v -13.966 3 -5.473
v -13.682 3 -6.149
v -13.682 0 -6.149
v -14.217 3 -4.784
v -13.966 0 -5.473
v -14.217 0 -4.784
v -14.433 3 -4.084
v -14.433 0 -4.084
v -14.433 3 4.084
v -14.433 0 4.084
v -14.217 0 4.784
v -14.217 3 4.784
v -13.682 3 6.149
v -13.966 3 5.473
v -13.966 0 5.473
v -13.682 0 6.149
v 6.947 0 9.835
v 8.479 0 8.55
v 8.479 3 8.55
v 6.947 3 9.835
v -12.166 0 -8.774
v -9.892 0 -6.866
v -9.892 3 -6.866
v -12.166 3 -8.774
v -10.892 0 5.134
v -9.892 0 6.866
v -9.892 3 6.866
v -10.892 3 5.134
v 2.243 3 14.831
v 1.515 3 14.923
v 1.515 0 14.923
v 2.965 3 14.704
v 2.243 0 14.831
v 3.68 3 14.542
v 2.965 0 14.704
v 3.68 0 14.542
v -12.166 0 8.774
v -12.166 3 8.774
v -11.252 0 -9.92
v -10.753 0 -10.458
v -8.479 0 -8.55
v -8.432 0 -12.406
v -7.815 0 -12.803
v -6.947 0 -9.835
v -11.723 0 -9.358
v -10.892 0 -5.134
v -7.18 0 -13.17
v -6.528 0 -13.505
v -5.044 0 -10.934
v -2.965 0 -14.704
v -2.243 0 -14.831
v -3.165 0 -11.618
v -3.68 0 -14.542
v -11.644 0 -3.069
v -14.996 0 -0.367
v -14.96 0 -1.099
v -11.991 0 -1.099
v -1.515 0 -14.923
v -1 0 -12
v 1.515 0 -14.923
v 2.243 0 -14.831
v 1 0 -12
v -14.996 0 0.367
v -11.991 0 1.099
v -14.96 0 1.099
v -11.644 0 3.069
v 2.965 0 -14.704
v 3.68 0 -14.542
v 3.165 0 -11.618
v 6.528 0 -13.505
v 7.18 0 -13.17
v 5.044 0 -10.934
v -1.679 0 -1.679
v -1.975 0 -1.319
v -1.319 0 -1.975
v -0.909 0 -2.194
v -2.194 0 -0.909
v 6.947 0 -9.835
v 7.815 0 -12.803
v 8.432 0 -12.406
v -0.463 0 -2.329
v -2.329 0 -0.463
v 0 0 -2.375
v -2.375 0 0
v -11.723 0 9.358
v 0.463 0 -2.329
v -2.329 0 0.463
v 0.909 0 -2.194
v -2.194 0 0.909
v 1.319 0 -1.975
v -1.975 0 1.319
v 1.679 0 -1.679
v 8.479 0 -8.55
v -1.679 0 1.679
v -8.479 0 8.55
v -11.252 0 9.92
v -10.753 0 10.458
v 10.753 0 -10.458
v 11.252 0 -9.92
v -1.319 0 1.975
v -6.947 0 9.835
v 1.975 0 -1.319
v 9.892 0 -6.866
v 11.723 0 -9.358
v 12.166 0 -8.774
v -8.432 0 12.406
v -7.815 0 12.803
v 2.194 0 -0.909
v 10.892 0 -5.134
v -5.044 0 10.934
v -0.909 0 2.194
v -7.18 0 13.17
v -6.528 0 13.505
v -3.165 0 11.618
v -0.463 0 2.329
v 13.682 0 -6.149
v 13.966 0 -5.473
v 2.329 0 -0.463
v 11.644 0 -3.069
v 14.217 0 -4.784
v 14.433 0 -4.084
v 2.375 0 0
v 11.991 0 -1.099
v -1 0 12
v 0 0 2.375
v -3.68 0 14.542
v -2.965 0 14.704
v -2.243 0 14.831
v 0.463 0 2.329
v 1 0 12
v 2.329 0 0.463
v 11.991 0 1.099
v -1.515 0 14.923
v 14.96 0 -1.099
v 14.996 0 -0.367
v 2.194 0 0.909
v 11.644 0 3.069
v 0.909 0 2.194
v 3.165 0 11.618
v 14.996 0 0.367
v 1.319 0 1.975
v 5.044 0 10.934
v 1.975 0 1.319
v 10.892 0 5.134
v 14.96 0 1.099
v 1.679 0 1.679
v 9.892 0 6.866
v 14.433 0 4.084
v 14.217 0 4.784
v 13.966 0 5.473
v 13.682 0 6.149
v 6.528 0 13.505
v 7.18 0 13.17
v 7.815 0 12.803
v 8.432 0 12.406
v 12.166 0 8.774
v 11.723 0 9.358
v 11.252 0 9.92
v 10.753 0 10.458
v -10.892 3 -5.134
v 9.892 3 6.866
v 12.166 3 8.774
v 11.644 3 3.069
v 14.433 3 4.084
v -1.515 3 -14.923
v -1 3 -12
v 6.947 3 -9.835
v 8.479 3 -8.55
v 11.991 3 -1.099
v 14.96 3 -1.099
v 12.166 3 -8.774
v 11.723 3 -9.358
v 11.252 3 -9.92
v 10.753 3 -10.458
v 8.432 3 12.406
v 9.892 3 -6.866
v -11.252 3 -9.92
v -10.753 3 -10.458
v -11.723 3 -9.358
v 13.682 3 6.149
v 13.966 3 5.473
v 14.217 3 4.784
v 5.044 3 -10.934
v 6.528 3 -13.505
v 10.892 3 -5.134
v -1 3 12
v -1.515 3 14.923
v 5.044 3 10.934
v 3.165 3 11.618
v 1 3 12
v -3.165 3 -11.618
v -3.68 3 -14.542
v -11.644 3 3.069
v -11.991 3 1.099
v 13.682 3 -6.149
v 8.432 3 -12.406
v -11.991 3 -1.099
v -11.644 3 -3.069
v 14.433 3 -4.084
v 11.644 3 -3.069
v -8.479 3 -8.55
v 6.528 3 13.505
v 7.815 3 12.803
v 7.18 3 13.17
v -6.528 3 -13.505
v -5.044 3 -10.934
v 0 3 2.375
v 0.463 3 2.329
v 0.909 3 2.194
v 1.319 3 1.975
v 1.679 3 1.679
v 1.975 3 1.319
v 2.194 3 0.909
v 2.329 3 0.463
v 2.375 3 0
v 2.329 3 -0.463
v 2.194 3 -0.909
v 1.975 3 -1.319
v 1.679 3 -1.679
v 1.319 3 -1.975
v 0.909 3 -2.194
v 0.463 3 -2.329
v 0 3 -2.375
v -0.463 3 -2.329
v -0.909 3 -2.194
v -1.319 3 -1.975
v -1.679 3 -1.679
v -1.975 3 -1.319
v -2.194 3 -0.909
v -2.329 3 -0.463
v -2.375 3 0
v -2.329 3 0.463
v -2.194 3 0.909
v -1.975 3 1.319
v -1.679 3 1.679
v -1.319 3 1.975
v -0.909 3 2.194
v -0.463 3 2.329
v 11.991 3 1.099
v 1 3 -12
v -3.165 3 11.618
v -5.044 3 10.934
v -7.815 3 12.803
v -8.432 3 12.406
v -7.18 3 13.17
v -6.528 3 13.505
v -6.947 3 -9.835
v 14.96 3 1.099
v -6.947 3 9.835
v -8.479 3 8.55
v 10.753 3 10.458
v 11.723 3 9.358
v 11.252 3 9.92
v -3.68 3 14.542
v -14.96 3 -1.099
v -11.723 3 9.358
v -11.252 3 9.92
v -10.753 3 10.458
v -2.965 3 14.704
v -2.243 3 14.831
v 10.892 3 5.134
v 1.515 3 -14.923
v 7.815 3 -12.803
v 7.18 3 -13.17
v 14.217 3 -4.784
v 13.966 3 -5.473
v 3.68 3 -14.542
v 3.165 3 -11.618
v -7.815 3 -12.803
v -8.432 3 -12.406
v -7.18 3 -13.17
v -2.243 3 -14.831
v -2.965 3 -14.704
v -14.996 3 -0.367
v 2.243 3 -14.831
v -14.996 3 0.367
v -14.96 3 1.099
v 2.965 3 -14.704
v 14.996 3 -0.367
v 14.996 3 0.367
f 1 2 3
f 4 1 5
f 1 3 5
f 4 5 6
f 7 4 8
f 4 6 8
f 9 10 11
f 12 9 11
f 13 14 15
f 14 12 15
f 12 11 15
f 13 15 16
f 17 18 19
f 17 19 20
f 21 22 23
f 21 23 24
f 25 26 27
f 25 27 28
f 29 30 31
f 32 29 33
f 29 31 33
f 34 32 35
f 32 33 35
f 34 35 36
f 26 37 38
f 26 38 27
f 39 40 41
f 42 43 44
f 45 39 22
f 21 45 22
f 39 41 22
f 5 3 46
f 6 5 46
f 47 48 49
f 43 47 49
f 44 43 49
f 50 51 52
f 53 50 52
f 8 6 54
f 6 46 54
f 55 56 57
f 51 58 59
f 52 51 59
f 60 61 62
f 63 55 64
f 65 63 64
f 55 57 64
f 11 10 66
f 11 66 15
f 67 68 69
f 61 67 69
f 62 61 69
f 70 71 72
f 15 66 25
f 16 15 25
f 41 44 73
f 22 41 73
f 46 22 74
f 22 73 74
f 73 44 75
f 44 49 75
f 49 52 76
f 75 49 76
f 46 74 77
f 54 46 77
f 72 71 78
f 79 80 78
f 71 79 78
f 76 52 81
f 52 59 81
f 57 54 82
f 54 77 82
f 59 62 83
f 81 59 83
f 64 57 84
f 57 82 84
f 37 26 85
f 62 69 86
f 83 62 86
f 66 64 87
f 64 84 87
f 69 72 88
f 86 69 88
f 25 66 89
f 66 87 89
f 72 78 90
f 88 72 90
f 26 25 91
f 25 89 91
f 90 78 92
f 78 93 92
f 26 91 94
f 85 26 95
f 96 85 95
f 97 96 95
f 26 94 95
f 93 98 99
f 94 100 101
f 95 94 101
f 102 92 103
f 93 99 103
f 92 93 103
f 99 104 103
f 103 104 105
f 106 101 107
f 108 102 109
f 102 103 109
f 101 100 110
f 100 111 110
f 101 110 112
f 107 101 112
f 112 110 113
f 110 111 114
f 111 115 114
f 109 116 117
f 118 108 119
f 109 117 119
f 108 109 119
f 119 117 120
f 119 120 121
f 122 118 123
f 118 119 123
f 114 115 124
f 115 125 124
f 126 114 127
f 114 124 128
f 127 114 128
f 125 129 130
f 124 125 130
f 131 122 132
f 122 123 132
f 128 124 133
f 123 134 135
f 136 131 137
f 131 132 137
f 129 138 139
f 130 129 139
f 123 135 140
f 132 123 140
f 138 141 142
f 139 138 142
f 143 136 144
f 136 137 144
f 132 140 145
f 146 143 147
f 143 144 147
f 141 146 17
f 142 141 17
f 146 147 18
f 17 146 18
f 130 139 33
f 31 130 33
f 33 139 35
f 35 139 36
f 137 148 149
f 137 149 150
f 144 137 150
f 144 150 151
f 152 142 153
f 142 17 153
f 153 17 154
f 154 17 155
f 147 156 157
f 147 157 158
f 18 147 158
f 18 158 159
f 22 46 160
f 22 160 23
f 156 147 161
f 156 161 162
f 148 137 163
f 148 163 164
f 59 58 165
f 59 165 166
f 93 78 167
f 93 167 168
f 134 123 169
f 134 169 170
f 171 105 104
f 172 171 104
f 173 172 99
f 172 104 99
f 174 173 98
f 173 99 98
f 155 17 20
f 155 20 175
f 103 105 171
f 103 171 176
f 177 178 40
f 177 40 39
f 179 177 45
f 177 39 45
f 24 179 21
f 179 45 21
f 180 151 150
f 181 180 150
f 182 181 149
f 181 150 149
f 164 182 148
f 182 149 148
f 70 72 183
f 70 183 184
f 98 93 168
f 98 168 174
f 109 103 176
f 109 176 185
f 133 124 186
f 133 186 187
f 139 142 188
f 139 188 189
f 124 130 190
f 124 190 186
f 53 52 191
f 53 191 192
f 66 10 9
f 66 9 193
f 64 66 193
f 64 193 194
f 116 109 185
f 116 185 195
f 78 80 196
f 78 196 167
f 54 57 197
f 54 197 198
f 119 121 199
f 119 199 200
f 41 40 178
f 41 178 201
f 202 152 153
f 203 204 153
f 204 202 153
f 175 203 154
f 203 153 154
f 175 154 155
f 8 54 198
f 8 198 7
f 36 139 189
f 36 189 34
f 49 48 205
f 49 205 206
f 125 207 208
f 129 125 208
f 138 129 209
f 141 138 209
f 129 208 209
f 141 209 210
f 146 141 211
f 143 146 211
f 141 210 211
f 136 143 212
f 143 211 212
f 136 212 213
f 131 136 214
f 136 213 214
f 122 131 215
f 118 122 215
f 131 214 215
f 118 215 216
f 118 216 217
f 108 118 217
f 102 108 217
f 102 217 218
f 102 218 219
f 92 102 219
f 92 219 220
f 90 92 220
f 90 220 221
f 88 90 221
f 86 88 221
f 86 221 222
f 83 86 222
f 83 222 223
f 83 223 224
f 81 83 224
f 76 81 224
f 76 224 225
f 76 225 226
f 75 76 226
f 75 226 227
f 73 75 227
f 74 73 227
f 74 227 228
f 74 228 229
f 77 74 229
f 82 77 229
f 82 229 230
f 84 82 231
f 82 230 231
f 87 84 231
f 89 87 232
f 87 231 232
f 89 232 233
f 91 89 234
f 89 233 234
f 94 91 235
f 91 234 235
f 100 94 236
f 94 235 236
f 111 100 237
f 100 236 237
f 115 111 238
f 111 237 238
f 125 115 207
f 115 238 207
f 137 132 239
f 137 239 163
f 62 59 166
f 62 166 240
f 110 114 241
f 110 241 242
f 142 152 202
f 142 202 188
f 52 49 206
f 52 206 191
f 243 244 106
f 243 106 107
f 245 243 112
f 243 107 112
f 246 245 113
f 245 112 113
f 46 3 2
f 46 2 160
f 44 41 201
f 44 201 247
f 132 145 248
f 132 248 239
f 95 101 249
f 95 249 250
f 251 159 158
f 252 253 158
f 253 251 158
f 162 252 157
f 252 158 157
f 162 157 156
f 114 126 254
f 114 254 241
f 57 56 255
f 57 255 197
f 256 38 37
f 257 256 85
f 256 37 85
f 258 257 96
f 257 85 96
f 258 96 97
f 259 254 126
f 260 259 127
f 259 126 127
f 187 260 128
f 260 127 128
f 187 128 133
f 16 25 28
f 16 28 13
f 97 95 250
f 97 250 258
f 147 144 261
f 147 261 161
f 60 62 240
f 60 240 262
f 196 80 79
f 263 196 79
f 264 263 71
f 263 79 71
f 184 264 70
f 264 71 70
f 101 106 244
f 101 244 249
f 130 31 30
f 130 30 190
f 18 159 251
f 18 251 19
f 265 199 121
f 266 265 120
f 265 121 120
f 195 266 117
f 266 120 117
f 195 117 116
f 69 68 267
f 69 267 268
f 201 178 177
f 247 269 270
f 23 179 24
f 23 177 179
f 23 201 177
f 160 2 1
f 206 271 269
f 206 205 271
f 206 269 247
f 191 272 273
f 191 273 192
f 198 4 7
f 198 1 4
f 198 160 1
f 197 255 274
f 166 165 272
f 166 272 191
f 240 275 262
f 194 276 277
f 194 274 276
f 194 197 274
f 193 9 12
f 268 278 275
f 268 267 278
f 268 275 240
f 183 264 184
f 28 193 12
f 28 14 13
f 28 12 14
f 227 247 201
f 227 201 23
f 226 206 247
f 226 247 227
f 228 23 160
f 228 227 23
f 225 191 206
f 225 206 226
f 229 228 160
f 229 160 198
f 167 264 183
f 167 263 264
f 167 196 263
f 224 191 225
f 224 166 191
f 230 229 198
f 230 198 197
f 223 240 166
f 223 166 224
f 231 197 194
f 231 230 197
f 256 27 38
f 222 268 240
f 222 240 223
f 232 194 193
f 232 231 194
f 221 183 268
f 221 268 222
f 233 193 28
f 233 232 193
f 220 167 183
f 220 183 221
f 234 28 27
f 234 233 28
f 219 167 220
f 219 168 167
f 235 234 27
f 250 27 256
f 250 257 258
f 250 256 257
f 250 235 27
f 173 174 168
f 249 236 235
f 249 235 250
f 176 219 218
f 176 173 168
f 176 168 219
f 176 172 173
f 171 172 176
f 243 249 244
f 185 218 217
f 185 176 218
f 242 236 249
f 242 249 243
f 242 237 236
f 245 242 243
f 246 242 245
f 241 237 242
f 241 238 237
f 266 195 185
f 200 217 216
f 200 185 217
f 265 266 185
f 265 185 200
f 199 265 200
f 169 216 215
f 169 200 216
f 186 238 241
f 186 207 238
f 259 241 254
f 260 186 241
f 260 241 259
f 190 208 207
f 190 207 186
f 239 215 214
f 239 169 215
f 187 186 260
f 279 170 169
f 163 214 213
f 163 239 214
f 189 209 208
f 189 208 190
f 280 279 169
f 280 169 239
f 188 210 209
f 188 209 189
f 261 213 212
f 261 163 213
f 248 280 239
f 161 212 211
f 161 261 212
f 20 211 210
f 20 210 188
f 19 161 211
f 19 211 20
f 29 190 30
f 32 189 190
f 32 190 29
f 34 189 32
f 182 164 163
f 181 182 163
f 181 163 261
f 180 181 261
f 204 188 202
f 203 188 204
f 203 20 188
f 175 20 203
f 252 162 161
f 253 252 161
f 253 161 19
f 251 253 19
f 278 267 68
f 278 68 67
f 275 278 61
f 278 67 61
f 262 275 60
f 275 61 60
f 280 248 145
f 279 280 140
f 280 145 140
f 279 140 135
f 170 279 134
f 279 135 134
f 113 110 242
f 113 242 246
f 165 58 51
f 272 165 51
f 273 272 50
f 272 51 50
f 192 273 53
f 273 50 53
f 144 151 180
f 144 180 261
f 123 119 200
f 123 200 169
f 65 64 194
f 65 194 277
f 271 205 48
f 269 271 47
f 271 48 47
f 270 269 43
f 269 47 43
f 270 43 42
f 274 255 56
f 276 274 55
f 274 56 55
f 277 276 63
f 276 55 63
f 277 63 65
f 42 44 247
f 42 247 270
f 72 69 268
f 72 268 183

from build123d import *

# Parameters (mm, degrees)
SKETCH_1_R               = 15
EXTRUDE_1_DEPTH          = 3
CUT_EXTRUDE_START        = -3
CUT_EXTRUDE_1_DEPTH      = 3
PATTERN_CIRCULAR_1_COUNT = 18
SKETCH_3_R               = 2.375
CUT_EXTRUDE_2_DEPTH      = 10


with BuildPart() as part:
    # Эскиз1 → Бобышка-Вытянуть1 (new body)
    with BuildSketch(Plane(origin=(0, 0, 0), x_dir=(1, 0, 0), z_dir=(0, 1, 0))):
        with Locations(Location((0, 0, 0), (0, 0, 270))):
            Circle(SKETCH_1_R)
    extrude(amount=EXTRUDE_1_DEPTH)

    # Эскиз2 → Вырез-Вытянуть1 (cut)
    with BuildSketch(Plane(origin=(0, 3, 0), x_dir=(1, 0, 0), z_dir=(0, 1, 0)).offset(CUT_EXTRUDE_START)):
        with BuildLine():
            ThreePointArc((1.515448005, 14.923250897), (0.75869511, 14.980800437), (0, 15))
            Line((0, 15), (0, 12))
            Line((0, 12), (1, 12))
            Line((1, 12), (1.515448005, 14.923250897))
        make_face()
        with BuildLine():
            Line((0, 12), (0, 15))
            ThreePointArc((0, 15), (-0.75869511, 14.980800437), (-1.515448005, 14.923250897))
            Line((-1.515448005, 14.923250897), (-1, 12))
            Line((-1, 12), (0, 12))
        make_face()
    cut_extrude_1 = extrude(amount=CUT_EXTRUDE_1_DEPTH, mode=Mode.SUBTRACT)

    # Круговой массив1: Вырез-Вытянуть1 ×18 about axis
    pattern_circular_1_axis = Axis((0, 0, 0), (0, 1, 0))
    for i in range(1, PATTERN_CIRCULAR_1_COUNT):
        add(cut_extrude_1.rotate(pattern_circular_1_axis, i * 360 / PATTERN_CIRCULAR_1_COUNT), mode=Mode.SUBTRACT)

    # Эскиз3 → Вырез-Вытянуть2 (cut)
    with BuildSketch(Plane(origin=(0, 3, 0), x_dir=(1, 0, 0), z_dir=(0, 1, 0))):
        with Locations(Location((0, 0, 0), (0, 0, 270))):
            Circle(SKETCH_3_R)
    extrude(amount=-CUT_EXTRUDE_2_DEPTH, mode=Mode.SUBTRACT)


solid = part.part
